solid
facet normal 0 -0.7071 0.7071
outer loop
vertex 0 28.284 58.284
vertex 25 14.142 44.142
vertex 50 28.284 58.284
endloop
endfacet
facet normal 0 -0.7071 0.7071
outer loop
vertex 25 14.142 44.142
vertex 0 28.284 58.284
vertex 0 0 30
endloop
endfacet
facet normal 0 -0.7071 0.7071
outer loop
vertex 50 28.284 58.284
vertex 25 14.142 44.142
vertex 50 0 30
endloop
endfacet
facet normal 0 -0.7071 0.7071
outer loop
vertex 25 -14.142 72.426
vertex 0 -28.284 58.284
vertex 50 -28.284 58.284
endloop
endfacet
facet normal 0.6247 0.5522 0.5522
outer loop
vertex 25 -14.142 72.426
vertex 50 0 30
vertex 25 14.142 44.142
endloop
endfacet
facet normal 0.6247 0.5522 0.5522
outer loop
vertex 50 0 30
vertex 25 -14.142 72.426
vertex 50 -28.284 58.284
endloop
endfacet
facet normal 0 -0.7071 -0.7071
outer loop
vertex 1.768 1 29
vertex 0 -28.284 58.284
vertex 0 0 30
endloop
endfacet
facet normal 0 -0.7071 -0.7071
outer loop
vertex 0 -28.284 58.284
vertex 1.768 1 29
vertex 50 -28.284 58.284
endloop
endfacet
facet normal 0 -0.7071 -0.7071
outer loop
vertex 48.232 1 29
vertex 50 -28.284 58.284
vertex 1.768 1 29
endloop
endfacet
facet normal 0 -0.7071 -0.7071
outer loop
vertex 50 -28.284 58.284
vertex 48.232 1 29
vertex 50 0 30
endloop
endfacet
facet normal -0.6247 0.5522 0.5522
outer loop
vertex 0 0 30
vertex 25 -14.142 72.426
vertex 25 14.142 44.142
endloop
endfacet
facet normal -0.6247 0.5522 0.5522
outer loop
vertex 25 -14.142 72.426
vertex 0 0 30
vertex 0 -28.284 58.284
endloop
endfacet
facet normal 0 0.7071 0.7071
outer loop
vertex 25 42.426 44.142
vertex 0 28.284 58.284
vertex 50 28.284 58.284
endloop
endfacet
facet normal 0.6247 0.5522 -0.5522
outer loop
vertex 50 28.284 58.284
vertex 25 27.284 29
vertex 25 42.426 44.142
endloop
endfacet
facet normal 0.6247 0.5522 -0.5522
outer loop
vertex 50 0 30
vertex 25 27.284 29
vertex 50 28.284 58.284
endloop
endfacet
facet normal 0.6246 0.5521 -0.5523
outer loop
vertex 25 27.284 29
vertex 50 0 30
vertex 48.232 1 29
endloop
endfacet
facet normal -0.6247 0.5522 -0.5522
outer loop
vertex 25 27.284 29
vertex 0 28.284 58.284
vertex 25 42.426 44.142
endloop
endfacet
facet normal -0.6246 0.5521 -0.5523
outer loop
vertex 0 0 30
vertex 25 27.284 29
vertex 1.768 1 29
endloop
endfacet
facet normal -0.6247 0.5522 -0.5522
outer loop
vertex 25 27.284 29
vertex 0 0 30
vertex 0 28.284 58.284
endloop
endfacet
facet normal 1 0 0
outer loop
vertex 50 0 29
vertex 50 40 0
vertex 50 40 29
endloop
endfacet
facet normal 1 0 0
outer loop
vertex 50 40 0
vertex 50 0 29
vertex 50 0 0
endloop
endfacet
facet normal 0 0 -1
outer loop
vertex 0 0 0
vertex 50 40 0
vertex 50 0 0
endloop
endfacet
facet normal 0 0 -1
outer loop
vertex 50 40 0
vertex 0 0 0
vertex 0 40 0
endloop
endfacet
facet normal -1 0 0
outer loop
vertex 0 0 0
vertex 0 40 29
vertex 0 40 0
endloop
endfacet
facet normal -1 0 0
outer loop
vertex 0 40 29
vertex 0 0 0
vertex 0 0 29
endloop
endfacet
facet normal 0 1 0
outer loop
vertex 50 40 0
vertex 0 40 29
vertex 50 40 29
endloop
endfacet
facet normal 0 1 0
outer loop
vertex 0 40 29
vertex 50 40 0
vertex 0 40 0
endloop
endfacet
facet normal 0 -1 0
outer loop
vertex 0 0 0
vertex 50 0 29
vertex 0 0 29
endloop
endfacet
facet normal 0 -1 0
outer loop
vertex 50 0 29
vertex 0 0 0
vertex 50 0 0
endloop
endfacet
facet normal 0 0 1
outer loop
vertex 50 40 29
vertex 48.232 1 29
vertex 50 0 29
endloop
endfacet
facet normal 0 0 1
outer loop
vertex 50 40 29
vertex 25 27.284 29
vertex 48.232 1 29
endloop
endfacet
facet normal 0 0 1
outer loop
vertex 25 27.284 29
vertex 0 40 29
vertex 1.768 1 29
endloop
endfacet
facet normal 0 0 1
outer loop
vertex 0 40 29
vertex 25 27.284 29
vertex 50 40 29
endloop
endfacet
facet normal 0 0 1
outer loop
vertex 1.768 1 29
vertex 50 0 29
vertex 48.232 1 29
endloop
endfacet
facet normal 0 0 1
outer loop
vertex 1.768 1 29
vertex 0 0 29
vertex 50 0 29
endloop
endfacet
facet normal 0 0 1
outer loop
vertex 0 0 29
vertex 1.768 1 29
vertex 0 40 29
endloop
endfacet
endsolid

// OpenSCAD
// Generated by CadMonkey
// Prompt: hey cadmonkey, create me a house
// Generated at: 2025-11-10 16:47:46

// House parameters
house_width = 50;
house_depth = 40;
house_height = 30;
roof_angle = 45;

module house() {
  // Base
  cube([house_width, house_depth, 1]);

  // Walls
  translate([0, 0, 1])
    cube([house_width, house_depth, house_height - 2]);

  // Roof
  translate([0, 0, house_height]) {
      rotate([roof_angle, 0, 0])
        linear_extrude(height = house_depth)
          polygon(points=[[0,0], [house_width/2, house_depth/2], [house_width, 0]]);

      rotate([-roof_angle, 0, 0])
        linear_extrude(height = house_depth)
          polygon(points=[[0,0], [house_width/2, house_depth/2], [house_width, 0]]);
  }
}

house();
